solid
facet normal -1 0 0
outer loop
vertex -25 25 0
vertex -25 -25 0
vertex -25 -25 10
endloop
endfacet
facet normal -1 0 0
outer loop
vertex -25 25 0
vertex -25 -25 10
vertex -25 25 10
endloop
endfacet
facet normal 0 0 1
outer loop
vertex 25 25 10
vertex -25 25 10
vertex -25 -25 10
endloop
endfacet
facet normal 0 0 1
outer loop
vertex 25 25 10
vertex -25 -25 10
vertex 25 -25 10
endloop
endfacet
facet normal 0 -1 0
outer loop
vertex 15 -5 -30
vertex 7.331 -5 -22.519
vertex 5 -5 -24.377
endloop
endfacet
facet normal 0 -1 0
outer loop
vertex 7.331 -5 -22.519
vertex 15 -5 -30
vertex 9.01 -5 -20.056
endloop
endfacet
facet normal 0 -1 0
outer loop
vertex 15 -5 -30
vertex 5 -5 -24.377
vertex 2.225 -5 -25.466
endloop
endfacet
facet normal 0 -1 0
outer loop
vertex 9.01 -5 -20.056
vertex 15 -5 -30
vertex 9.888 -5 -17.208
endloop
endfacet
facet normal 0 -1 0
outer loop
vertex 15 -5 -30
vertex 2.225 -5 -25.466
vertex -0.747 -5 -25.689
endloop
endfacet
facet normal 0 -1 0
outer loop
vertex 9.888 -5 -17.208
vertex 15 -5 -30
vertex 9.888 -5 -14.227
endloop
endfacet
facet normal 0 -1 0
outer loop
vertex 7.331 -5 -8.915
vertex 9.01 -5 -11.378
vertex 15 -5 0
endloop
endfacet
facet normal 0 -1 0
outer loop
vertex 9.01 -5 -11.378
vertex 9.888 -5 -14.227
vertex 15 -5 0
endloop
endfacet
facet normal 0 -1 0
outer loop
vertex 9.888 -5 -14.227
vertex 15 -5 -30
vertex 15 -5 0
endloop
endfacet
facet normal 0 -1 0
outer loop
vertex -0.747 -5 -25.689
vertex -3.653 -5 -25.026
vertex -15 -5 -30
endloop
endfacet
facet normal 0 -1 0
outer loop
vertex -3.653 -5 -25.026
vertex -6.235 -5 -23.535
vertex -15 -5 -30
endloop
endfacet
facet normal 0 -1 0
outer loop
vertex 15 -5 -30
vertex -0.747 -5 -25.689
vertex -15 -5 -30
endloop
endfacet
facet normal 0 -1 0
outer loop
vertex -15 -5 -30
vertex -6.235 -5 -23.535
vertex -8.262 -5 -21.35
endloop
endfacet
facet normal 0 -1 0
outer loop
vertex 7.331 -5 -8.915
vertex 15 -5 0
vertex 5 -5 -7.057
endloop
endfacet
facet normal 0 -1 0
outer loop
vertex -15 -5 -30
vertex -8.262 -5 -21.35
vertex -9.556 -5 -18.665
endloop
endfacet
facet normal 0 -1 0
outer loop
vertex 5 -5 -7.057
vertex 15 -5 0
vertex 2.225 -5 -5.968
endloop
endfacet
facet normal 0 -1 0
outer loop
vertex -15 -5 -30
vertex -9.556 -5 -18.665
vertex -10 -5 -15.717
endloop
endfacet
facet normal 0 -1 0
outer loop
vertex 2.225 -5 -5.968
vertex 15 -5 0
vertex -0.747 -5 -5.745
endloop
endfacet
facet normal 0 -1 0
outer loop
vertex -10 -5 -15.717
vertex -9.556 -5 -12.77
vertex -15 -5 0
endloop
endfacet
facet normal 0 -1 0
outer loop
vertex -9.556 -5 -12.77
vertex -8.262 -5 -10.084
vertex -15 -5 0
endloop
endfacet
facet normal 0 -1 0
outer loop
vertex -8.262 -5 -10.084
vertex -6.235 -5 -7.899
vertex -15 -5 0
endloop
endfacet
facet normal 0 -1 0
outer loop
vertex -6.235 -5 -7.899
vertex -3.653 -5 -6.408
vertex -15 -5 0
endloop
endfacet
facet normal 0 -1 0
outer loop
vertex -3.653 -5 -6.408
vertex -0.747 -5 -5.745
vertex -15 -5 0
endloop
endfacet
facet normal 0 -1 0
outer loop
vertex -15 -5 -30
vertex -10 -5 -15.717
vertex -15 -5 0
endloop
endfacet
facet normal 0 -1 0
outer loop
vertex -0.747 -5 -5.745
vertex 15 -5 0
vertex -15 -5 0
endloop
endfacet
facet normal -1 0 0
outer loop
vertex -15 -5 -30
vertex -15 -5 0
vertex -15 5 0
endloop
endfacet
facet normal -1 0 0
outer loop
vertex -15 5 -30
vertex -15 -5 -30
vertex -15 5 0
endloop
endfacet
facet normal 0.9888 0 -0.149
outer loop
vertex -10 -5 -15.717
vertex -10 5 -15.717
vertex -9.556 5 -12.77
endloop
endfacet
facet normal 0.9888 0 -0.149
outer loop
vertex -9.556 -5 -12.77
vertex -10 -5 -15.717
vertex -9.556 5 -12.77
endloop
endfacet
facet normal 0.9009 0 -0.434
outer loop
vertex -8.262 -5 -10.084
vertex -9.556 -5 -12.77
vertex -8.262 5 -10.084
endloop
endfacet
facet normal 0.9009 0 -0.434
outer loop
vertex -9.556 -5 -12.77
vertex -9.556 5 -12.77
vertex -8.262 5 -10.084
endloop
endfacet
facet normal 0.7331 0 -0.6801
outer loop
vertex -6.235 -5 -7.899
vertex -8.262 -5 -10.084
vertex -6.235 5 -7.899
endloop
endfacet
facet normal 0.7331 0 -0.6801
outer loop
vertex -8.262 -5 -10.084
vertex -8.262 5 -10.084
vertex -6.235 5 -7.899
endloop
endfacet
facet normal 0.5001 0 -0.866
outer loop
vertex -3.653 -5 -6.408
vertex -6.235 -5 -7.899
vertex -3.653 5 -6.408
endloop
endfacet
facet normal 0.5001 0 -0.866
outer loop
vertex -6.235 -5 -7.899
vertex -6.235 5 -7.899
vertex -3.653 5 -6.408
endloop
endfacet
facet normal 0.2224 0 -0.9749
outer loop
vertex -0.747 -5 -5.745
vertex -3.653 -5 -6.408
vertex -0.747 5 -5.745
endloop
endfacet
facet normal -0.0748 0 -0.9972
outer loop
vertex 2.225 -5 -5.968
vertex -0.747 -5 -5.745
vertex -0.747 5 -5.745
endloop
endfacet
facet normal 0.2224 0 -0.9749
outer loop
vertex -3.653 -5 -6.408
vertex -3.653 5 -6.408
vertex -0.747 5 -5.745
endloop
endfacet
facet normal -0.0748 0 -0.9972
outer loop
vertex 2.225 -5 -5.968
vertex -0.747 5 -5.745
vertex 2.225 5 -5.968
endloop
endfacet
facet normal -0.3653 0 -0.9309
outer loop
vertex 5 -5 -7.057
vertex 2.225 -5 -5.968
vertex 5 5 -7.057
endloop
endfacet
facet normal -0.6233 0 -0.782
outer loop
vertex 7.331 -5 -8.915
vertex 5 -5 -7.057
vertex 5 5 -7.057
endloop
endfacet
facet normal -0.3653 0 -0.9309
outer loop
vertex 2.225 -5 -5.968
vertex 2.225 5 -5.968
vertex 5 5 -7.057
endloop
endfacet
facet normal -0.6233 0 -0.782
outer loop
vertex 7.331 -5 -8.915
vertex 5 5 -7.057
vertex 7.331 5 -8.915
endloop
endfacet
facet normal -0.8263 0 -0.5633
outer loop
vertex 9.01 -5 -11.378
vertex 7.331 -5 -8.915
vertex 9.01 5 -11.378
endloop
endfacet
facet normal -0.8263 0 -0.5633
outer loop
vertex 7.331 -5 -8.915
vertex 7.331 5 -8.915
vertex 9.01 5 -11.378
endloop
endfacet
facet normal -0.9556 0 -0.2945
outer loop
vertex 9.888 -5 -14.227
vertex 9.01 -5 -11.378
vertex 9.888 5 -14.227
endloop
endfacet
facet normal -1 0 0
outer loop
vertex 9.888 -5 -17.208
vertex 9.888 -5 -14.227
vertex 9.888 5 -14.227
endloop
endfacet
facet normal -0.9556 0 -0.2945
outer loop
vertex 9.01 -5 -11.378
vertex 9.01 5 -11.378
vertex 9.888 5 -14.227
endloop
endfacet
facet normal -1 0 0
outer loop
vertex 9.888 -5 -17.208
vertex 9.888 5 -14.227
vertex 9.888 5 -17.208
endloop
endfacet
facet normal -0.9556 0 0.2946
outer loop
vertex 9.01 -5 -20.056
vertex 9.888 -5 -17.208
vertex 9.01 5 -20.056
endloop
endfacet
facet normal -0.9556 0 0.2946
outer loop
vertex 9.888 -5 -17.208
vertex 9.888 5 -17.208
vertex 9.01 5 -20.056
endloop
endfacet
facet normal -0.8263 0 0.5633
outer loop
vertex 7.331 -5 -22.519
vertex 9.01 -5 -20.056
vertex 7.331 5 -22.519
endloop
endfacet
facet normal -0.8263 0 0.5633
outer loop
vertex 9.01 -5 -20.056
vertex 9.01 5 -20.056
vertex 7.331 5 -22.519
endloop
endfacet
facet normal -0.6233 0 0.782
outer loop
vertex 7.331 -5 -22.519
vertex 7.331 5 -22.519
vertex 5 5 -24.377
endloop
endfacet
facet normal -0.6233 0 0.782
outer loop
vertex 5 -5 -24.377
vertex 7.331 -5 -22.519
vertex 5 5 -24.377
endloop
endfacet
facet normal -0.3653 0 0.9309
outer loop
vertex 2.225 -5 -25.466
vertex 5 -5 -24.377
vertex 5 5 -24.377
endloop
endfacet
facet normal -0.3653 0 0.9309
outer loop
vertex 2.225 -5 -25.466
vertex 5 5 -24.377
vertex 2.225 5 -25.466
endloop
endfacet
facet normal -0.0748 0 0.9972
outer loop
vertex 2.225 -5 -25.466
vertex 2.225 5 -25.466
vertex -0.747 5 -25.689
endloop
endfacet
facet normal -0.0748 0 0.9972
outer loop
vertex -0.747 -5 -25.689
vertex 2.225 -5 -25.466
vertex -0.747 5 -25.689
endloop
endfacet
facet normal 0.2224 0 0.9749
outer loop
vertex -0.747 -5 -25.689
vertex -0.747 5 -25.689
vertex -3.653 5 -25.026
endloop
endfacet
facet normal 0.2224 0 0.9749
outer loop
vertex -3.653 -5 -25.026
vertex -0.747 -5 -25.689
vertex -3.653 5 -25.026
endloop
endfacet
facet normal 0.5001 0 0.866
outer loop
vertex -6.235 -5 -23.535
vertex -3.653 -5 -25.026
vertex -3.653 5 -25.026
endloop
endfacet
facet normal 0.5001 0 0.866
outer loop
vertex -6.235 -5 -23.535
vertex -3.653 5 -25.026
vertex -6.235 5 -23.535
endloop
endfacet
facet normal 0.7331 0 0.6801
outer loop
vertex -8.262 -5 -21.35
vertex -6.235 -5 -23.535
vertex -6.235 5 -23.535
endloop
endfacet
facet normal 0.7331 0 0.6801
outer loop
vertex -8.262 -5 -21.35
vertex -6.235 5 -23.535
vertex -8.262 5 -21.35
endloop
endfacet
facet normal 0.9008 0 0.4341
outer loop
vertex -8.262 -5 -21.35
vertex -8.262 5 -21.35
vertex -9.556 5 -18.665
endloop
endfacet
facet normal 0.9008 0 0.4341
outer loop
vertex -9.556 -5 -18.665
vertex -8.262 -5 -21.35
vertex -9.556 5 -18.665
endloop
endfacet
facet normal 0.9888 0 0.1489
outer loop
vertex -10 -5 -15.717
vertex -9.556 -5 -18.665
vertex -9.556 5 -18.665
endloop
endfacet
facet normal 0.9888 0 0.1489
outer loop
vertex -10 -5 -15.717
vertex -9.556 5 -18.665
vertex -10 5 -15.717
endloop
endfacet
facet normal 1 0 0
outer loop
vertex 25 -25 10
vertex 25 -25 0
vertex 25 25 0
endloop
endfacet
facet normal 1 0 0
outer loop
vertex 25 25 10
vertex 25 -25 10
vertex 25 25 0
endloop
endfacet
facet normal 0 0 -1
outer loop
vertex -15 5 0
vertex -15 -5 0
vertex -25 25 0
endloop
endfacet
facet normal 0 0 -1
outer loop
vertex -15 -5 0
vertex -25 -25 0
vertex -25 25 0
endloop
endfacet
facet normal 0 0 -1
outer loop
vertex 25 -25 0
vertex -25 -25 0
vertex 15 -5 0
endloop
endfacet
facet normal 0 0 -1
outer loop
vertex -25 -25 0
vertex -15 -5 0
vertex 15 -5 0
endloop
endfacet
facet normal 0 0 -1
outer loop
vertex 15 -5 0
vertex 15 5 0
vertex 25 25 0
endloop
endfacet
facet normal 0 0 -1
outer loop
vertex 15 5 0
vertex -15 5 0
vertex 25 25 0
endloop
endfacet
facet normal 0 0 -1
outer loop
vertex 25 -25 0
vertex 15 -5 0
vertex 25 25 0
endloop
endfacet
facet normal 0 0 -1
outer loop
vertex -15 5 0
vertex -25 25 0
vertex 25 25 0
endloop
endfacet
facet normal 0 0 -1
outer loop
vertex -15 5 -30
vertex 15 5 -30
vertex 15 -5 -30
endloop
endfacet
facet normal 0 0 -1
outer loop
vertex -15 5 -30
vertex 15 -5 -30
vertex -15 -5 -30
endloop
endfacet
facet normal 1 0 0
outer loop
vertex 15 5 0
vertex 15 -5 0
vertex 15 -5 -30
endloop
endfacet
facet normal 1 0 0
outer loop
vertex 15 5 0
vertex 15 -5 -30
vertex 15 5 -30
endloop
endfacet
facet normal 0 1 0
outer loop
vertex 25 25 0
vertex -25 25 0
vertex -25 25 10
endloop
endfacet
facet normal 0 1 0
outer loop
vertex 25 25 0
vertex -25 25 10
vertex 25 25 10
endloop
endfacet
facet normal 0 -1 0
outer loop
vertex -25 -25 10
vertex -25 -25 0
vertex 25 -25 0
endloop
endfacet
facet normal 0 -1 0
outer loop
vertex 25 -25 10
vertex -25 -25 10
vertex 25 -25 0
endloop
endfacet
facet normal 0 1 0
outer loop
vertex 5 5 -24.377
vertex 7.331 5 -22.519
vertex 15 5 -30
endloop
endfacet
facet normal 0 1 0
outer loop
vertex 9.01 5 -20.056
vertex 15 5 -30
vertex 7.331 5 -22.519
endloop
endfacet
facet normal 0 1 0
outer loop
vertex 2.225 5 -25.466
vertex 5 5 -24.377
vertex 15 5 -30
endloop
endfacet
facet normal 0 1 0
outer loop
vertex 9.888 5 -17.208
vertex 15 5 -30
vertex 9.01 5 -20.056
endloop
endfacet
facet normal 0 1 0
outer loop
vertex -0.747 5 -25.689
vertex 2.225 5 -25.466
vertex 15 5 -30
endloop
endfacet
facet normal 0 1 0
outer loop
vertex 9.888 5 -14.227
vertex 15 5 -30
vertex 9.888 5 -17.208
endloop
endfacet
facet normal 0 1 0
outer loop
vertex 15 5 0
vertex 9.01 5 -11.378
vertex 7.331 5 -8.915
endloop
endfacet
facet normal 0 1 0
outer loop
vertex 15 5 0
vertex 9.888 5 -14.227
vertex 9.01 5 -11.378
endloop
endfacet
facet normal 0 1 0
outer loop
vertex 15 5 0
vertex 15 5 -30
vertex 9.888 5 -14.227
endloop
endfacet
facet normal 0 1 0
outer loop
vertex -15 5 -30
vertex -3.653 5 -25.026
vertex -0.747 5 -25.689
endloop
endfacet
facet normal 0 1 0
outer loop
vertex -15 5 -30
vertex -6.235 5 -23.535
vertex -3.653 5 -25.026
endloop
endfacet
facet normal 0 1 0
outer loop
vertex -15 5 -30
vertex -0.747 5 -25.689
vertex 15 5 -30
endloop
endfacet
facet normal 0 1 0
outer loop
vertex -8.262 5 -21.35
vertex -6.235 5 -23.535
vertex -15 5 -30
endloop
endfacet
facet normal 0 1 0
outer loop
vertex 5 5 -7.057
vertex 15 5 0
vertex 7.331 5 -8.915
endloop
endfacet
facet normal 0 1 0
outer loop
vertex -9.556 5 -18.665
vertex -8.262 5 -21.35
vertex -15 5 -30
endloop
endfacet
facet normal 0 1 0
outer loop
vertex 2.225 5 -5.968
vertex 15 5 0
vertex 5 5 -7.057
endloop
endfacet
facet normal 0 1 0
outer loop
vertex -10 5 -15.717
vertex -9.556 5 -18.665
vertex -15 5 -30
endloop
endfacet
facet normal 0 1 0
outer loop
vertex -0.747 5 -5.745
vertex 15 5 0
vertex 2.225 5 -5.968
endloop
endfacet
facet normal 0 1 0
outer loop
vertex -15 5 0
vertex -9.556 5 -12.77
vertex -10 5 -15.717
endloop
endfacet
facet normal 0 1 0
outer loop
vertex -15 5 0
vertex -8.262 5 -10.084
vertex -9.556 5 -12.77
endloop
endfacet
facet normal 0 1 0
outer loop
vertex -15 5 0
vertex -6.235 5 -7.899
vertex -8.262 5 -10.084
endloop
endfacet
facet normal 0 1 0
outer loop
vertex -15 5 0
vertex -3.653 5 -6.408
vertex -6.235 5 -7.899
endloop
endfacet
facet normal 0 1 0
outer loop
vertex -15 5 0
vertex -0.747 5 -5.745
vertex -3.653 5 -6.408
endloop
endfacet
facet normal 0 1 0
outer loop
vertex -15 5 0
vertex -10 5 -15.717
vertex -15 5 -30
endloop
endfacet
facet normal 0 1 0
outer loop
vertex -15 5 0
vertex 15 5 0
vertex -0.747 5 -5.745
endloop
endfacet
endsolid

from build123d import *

# Parameters (mm, degrees)
SKETCH_1_W          = 50
SKETCH_1_H          = 50
EXTRUDE_1_DEPTH     = 10
SKETCH_2_W          = 30
SKETCH_2_H          = 10
EXTRUDE_2_DEPTH     = 30
SKETCH_3_R          = 10
CUT_EXTRUDE_1_DEPTH = 30


with BuildPart() as part:
    # 草图1 → 凸台-拉伸1 (new body)
    with BuildSketch(Plane.XY):
        Rectangle(SKETCH_1_W, SKETCH_1_H)
    extrude(amount=EXTRUDE_1_DEPTH)

    # 草图2 → 凸台-拉伸2 (add)
    with BuildSketch(Plane(origin=(0, 0, 0), x_dir=(-1, 0, 0), z_dir=(0, 0, -1))):
        Rectangle(SKETCH_2_W, SKETCH_2_H)
    extrude(amount=EXTRUDE_2_DEPTH)

    # 草图3 → 切除-拉伸1 (cut)
    with BuildSketch(Plane(origin=(0, 5, 0), x_dir=(1, 0, 0), z_dir=(0, 1, 0))):
        with Locations(Location((0, 15.717133963, 0), (0, 0, 180))):
            Circle(SKETCH_3_R)
    extrude(amount=-CUT_EXTRUDE_1_DEPTH, mode=Mode.SUBTRACT)


solid = part.part
